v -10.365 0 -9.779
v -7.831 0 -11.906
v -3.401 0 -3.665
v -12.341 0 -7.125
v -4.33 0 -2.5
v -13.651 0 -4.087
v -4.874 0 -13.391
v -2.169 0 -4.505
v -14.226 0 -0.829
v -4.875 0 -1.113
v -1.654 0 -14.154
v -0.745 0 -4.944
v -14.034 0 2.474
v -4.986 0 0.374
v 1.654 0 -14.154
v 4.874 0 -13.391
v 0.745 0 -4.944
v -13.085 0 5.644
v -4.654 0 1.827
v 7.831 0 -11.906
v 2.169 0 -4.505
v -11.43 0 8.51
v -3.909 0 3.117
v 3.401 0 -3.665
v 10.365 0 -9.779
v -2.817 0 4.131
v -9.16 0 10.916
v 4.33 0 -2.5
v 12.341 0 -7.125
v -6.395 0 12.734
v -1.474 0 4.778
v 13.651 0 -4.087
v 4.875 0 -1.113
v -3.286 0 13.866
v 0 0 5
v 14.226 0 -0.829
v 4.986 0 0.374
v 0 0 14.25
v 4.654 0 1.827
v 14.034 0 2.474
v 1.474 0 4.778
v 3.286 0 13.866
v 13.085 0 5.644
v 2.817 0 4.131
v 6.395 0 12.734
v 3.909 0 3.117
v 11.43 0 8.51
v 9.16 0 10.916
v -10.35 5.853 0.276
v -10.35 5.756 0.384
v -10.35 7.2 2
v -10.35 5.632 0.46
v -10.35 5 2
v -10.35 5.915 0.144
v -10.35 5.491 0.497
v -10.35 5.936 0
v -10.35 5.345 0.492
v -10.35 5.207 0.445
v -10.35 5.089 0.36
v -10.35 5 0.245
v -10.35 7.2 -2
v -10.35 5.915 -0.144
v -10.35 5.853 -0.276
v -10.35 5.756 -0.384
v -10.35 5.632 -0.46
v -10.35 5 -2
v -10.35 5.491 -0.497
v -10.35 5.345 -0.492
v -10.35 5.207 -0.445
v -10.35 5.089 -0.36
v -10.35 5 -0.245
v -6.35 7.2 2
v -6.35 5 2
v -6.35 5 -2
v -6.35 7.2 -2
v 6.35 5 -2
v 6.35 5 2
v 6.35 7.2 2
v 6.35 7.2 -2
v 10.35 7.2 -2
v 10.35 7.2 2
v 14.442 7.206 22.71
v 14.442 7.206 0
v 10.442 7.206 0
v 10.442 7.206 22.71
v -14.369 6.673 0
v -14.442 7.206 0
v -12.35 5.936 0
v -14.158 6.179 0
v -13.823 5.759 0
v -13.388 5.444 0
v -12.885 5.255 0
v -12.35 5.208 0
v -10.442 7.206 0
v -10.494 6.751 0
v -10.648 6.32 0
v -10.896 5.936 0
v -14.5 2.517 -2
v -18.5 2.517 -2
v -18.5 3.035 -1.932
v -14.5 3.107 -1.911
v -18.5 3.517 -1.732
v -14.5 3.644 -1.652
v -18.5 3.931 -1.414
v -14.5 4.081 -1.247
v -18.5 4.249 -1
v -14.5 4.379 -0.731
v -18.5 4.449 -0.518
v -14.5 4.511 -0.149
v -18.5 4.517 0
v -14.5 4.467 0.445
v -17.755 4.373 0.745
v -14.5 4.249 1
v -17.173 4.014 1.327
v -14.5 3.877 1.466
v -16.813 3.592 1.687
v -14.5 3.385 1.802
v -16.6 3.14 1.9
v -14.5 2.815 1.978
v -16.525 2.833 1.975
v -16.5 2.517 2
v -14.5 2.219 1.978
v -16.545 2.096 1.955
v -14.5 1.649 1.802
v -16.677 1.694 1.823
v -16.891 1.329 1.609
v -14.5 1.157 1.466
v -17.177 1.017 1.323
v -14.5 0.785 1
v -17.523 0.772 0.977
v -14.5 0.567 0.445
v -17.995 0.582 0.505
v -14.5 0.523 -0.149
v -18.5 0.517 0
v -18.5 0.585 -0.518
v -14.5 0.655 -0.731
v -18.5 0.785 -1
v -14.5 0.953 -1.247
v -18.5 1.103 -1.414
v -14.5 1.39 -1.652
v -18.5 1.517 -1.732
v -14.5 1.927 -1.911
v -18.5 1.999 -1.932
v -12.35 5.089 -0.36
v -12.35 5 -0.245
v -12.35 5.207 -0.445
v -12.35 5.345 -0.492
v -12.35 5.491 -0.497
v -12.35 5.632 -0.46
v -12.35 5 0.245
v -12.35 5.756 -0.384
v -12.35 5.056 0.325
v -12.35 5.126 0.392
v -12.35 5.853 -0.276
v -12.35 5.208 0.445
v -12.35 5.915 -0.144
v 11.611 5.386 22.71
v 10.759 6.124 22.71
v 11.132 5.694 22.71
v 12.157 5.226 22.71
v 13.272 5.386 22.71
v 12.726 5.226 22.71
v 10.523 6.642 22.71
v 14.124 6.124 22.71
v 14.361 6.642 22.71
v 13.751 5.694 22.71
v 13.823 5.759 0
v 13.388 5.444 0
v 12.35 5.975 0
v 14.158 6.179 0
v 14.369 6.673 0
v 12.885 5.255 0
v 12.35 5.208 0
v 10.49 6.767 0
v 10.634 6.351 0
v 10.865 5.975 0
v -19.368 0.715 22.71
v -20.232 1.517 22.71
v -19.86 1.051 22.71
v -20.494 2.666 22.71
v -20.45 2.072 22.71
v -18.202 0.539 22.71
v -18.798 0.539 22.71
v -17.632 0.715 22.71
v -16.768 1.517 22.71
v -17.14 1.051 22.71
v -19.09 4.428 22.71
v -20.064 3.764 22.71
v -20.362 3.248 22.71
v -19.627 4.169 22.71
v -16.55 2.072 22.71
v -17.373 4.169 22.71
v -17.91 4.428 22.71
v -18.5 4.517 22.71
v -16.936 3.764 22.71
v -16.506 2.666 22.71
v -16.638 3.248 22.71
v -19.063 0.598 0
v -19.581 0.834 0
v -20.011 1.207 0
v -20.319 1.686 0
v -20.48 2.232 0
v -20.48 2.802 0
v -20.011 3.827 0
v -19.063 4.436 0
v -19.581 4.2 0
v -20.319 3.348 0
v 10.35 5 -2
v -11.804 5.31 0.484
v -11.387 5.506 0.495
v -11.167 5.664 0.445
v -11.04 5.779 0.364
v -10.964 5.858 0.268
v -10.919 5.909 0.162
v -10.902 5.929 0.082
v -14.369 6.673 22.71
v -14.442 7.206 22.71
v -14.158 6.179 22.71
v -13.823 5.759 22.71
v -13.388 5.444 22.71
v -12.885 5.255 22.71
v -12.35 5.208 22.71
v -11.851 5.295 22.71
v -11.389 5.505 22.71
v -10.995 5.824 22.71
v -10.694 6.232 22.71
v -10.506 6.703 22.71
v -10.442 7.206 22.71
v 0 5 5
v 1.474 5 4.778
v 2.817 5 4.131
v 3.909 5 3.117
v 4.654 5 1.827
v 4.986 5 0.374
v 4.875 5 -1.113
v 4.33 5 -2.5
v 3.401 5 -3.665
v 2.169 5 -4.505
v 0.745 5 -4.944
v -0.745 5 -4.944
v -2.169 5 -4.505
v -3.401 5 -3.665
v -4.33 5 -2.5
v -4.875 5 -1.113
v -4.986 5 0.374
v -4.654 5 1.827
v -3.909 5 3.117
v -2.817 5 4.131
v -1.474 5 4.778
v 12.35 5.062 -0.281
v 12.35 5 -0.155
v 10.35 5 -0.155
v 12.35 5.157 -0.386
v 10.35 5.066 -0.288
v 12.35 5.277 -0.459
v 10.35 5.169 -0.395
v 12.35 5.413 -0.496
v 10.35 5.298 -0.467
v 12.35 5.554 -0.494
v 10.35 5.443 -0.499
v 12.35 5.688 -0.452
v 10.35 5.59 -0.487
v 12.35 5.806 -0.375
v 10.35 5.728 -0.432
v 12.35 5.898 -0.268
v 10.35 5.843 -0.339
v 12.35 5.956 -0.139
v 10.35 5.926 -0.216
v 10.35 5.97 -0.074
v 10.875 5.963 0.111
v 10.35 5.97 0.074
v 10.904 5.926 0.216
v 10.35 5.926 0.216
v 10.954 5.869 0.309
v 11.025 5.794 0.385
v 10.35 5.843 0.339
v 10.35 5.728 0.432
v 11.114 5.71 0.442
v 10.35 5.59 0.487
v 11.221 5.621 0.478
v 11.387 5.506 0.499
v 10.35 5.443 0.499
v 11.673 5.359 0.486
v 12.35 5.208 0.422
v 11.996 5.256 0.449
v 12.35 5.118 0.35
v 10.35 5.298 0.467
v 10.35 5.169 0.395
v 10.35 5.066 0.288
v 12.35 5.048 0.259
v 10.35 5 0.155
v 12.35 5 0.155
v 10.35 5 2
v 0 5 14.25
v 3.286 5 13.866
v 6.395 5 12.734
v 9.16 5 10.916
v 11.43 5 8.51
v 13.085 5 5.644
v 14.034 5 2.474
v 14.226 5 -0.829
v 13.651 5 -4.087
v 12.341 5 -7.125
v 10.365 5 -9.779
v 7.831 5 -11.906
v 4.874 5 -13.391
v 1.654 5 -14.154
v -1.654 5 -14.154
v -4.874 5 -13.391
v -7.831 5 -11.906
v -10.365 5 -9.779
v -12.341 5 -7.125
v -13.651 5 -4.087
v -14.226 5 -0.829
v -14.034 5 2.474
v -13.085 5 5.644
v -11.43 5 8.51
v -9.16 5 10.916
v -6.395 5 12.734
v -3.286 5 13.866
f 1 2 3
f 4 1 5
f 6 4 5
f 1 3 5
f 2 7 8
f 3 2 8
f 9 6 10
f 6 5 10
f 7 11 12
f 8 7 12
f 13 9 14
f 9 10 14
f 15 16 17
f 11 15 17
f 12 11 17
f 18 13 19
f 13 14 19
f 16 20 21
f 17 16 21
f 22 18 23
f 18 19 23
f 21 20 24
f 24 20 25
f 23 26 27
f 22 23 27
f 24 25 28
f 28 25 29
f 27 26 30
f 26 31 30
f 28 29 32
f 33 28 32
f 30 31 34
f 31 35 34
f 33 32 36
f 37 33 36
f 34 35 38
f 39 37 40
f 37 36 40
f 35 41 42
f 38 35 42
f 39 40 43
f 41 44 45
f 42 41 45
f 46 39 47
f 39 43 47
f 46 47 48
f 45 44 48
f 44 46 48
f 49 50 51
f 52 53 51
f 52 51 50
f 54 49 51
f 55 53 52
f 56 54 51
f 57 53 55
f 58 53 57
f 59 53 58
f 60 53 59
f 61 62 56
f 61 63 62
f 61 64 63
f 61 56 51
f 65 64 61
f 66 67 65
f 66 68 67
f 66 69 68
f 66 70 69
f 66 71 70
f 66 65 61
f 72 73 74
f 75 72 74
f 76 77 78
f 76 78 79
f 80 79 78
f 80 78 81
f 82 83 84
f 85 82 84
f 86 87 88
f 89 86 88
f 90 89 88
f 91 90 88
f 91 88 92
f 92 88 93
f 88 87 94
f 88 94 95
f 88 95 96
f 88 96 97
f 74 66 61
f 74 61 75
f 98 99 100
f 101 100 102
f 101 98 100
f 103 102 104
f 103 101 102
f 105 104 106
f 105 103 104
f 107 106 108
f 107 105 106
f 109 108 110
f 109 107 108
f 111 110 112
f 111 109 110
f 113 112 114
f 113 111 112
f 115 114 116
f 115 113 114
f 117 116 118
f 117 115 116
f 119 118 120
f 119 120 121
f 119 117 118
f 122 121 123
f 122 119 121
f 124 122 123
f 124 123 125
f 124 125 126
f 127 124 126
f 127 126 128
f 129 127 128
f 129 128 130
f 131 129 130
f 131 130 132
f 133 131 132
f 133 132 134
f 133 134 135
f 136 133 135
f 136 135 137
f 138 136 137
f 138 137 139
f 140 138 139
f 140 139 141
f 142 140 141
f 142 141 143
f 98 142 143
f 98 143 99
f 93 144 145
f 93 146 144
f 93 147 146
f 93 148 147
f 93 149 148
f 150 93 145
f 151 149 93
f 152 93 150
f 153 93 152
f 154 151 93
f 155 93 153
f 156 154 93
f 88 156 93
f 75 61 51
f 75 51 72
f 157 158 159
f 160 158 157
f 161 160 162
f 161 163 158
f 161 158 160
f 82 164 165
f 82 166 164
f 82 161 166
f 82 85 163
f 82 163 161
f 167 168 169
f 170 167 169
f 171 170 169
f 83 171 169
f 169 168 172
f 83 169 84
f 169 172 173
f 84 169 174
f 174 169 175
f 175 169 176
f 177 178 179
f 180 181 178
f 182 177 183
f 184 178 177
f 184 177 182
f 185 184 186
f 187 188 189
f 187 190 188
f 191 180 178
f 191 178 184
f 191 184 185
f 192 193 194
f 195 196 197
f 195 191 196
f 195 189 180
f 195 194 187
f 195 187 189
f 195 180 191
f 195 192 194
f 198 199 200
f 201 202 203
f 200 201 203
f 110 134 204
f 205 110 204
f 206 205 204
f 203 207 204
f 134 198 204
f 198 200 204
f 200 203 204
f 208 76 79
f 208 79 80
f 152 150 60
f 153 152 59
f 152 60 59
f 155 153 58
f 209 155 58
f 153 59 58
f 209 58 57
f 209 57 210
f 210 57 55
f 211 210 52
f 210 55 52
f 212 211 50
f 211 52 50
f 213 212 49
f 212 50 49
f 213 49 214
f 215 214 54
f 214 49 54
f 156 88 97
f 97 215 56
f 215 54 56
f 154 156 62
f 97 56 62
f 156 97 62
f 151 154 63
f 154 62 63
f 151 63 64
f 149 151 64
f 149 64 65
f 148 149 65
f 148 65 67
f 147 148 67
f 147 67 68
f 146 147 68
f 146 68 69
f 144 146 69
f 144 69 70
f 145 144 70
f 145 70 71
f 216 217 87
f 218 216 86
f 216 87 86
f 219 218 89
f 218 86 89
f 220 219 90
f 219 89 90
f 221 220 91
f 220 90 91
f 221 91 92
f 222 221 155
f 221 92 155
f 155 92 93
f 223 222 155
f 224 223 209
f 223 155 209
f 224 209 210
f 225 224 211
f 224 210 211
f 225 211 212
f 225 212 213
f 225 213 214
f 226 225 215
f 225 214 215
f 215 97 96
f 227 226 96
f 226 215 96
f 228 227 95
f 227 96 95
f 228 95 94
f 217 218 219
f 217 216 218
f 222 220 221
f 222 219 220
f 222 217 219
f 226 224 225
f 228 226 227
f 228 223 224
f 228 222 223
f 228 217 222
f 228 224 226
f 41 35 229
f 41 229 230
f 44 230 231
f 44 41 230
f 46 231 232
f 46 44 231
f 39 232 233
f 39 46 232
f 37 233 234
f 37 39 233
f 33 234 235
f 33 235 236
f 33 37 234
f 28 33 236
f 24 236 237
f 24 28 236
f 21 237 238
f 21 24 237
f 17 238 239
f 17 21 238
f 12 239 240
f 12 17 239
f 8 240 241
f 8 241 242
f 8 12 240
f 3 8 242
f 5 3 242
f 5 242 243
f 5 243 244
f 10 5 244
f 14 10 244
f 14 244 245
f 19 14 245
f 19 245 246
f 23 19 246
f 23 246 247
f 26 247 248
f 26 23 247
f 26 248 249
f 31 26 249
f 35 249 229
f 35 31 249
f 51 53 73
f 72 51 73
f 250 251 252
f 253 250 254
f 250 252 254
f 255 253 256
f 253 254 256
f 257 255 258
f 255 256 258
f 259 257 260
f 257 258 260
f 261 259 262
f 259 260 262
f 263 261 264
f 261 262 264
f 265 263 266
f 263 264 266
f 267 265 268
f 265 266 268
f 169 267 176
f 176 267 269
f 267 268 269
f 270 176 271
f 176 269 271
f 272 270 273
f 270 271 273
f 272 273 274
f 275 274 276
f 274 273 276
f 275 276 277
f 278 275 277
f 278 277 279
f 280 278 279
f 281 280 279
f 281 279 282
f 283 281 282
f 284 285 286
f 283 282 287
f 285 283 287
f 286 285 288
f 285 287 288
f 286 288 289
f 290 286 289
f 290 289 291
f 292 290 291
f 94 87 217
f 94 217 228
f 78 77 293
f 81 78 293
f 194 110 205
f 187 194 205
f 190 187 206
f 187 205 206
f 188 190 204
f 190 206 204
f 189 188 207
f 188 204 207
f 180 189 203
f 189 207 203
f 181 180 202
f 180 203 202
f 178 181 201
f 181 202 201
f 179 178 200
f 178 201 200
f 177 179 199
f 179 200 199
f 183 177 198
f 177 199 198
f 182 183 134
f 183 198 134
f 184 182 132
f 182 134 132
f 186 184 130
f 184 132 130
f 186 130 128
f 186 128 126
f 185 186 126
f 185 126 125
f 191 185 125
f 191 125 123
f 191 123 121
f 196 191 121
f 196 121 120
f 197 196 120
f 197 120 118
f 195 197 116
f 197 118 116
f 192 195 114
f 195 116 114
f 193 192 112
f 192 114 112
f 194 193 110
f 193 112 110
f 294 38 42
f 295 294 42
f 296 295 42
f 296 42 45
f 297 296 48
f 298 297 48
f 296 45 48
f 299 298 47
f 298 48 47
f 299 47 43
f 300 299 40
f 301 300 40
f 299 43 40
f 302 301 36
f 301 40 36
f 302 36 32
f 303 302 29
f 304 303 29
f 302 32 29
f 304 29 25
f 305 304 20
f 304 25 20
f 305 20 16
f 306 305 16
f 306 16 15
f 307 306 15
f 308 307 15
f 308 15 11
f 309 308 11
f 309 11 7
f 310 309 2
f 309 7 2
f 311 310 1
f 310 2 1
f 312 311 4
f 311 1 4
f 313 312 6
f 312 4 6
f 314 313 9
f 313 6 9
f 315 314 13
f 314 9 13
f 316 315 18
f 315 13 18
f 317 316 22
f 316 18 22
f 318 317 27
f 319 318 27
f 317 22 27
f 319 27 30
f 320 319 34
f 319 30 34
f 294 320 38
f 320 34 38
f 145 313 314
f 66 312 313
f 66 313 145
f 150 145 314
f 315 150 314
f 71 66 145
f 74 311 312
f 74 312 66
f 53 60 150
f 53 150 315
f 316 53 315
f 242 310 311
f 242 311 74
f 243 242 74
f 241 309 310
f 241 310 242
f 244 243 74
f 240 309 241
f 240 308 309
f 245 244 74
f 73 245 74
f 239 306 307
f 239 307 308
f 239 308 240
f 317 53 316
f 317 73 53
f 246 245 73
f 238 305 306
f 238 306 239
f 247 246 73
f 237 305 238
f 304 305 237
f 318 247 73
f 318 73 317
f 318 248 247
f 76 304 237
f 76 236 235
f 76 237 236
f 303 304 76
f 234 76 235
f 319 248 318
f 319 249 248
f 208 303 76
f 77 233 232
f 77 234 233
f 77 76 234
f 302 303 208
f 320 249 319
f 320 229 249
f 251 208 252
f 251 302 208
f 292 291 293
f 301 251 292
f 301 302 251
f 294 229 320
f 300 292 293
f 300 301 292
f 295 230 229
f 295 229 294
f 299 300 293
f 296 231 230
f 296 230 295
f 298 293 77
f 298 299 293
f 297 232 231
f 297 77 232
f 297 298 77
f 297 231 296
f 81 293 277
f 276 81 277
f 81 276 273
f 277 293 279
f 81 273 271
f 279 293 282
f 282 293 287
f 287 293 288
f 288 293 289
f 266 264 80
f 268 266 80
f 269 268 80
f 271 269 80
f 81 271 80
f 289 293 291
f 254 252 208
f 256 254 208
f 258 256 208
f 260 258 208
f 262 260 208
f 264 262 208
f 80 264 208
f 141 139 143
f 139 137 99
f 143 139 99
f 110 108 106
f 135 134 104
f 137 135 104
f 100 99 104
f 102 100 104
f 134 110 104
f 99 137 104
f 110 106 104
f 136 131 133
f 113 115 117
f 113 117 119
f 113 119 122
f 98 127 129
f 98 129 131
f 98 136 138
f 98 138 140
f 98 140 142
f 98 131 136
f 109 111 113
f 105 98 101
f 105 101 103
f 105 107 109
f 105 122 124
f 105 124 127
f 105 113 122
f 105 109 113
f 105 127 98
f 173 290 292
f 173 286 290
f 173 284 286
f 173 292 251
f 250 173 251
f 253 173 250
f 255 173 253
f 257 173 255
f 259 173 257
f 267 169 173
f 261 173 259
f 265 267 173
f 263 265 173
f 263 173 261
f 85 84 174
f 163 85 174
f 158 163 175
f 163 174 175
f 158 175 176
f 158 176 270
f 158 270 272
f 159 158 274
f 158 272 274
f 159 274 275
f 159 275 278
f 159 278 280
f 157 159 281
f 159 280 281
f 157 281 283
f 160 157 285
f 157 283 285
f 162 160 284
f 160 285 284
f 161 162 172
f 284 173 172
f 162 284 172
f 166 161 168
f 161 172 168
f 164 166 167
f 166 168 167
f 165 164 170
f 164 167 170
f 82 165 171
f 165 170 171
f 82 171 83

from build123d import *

# Parameters (mm, degrees)
SKETCH2_R            = 14.25
SKETCH2_R_2          = 5
BOSS_EXTRUDE1_DEPTH  = 5
SKETCH3_W            = 4
SKETCH3_H            = 4
BOSS_EXTRUDE2_DEPTH  = 2.2
SKETCH4_R            = 0.5
BOSS_EXTRUDE3_DEPTH  = 2
SKETCH6_R            = 0.5
BOSS_EXTRUDE4_DEPTH  = 2
SKETCH13_R           = 2
BOSS_EXTRUDE12_DEPTH = 50
SKETCH15_R           = 2
BOSS_EXTRUDE13_DEPTH = 4
SKETCH16_R           = 2
BOSS_EXTRUDE14_DEPTH = 60
SKETCH17_W           = 30.81160489
SKETCH17_H           = 4.482014718
CUT_EXTRUDE1_DEPTH   = 10.8
SKETCH18_W           = 93.143652273
SKETCH18_H           = 67.570442105
CUT_EXTRUDE2_DEPTH   = 43
SKETCH19_W           = 82.908946891
SKETCH19_H           = 58.215370207
CUT_EXTRUDE3_DEPTH   = 8


with BuildPart() as part:
    # Sketch2 → Boss-Extrude1 (new body)
    with BuildSketch(Plane(origin=(0, 0, 0), x_dir=(1, 0, 0), z_dir=(0, 1, 0))):
        with Locations(Location((0, 0, 0), (0, 0, 270))):
            Circle(SKETCH2_R)
        with Locations(Location((0, 0, 0), (0, 0, 270))):
            Circle(SKETCH2_R_2, mode=Mode.SUBTRACT)
    extrude(amount=BOSS_EXTRUDE1_DEPTH)

    # Sketch3 → Boss-Extrude2 (add)
    with BuildSketch(Plane(origin=(0, 5, 0), x_dir=(1, 0, 0), z_dir=(0, 1, 0))):
        with Locations((8.35, 0)):
            Rectangle(SKETCH3_W, SKETCH3_H)
        with Locations((-8.35, 0)):
            Rectangle(SKETCH3_W, SKETCH3_H)
    extrude(amount=BOSS_EXTRUDE2_DEPTH)

    # Sketch4 → Boss-Extrude3 (add)
    with BuildSketch(Plane(origin=(10.35, 0, 0), x_dir=(0, 0, -1), z_dir=(1, 0, 0))):
        with Locations((0, 5.475348584)):
            Circle(SKETCH4_R)
    extrude(amount=BOSS_EXTRUDE3_DEPTH)

    # Sketch6 → Boss-Extrude4 (add)
    with BuildSketch(Plane.ZY.offset(10.35)):
        with Locations((0, 5.435884372)):
            Circle(SKETCH6_R)
    extrude(amount=BOSS_EXTRUDE4_DEPTH)

    # Sketch13 → Boss-Extrude12 (add)
    with BuildSketch(Plane.XY):
        with Locations(Location((-12.441622338, 7.205589908, 0), (0, 0, 272.6257056))):
            Circle(SKETCH13_R)
        with Locations(Location((12.441622338, 7.205589908, 0), (0, 0, 180))):
            Circle(SKETCH13_R)
    extrude(amount=BOSS_EXTRUDE12_DEPTH)

    # Sketch17 → Cut-Extrude1 (cut)
    with BuildSketch(Plane(origin=(0, 0, 0), x_dir=(-1, 0, 0), z_dir=(0, 0, -1))):
        with Locations((-0.964180107, 9.446597267)):
            Rectangle(SKETCH17_W, SKETCH17_H)
    extrude(amount=-CUT_EXTRUDE1_DEPTH, mode=Mode.SUBTRACT)


with BuildPart() as body_2:
    # Sketch15 → Boss-Extrude13 (new body)
    with BuildSketch(Plane(origin=(-14.5, 0, 0), x_dir=(0, 0, -1), z_dir=(1, 0, 0))):
        with Locations((0, 2.517001549)):
            Circle(SKETCH15_R)
    extrude(amount=-BOSS_EXTRUDE13_DEPTH)

    # Sketch16 → Boss-Extrude14 (add)
    with BuildSketch(Plane(origin=(0, 11.710958491, 0), x_dir=(1, 0, 0), z_dir=(0, 0, 1))):
        with Locations(Location((-18.5, -9.193956942, 0), (0, 0, 90))):
            Circle(SKETCH16_R)
    extrude(amount=BOSS_EXTRUDE14_DEPTH)


with BuildPart() as cut_extrude2_tool:
    # Sketch18 → Cut-Extrude2 (new body)
    with BuildSketch(Plane.XY.offset(22.71)):
        with Locations((-3.408022591, 1.268285043)):
            Rectangle(SKETCH18_W, SKETCH18_H)
    extrude(amount=CUT_EXTRUDE2_DEPTH)


with BuildPart() as part_1:
    add(part.part)

    # Cut-Extrude2: cut by cut_extrude2_tool
    add(cut_extrude2_tool.part, mode=Mode.SUBTRACT)

    # Sketch19 → Cut-Extrude3 (cut)
    with BuildSketch(Plane(origin=(0, 7.205589908, 0), x_dir=(1, 0, 0), z_dir=(0, 1, 0))):
        with Locations((3.634474693, -11.396239252)):
            Rectangle(SKETCH19_W, SKETCH19_H)
    extrude(amount=CUT_EXTRUDE3_DEPTH, mode=Mode.SUBTRACT)


with BuildPart() as body_2_1:
    add(body_2.part)

    # Cut-Extrude2: cut by cut_extrude2_tool
    add(cut_extrude2_tool.part, mode=Mode.SUBTRACT)


solid = Compound([part_1.part, body_2_1.part])
